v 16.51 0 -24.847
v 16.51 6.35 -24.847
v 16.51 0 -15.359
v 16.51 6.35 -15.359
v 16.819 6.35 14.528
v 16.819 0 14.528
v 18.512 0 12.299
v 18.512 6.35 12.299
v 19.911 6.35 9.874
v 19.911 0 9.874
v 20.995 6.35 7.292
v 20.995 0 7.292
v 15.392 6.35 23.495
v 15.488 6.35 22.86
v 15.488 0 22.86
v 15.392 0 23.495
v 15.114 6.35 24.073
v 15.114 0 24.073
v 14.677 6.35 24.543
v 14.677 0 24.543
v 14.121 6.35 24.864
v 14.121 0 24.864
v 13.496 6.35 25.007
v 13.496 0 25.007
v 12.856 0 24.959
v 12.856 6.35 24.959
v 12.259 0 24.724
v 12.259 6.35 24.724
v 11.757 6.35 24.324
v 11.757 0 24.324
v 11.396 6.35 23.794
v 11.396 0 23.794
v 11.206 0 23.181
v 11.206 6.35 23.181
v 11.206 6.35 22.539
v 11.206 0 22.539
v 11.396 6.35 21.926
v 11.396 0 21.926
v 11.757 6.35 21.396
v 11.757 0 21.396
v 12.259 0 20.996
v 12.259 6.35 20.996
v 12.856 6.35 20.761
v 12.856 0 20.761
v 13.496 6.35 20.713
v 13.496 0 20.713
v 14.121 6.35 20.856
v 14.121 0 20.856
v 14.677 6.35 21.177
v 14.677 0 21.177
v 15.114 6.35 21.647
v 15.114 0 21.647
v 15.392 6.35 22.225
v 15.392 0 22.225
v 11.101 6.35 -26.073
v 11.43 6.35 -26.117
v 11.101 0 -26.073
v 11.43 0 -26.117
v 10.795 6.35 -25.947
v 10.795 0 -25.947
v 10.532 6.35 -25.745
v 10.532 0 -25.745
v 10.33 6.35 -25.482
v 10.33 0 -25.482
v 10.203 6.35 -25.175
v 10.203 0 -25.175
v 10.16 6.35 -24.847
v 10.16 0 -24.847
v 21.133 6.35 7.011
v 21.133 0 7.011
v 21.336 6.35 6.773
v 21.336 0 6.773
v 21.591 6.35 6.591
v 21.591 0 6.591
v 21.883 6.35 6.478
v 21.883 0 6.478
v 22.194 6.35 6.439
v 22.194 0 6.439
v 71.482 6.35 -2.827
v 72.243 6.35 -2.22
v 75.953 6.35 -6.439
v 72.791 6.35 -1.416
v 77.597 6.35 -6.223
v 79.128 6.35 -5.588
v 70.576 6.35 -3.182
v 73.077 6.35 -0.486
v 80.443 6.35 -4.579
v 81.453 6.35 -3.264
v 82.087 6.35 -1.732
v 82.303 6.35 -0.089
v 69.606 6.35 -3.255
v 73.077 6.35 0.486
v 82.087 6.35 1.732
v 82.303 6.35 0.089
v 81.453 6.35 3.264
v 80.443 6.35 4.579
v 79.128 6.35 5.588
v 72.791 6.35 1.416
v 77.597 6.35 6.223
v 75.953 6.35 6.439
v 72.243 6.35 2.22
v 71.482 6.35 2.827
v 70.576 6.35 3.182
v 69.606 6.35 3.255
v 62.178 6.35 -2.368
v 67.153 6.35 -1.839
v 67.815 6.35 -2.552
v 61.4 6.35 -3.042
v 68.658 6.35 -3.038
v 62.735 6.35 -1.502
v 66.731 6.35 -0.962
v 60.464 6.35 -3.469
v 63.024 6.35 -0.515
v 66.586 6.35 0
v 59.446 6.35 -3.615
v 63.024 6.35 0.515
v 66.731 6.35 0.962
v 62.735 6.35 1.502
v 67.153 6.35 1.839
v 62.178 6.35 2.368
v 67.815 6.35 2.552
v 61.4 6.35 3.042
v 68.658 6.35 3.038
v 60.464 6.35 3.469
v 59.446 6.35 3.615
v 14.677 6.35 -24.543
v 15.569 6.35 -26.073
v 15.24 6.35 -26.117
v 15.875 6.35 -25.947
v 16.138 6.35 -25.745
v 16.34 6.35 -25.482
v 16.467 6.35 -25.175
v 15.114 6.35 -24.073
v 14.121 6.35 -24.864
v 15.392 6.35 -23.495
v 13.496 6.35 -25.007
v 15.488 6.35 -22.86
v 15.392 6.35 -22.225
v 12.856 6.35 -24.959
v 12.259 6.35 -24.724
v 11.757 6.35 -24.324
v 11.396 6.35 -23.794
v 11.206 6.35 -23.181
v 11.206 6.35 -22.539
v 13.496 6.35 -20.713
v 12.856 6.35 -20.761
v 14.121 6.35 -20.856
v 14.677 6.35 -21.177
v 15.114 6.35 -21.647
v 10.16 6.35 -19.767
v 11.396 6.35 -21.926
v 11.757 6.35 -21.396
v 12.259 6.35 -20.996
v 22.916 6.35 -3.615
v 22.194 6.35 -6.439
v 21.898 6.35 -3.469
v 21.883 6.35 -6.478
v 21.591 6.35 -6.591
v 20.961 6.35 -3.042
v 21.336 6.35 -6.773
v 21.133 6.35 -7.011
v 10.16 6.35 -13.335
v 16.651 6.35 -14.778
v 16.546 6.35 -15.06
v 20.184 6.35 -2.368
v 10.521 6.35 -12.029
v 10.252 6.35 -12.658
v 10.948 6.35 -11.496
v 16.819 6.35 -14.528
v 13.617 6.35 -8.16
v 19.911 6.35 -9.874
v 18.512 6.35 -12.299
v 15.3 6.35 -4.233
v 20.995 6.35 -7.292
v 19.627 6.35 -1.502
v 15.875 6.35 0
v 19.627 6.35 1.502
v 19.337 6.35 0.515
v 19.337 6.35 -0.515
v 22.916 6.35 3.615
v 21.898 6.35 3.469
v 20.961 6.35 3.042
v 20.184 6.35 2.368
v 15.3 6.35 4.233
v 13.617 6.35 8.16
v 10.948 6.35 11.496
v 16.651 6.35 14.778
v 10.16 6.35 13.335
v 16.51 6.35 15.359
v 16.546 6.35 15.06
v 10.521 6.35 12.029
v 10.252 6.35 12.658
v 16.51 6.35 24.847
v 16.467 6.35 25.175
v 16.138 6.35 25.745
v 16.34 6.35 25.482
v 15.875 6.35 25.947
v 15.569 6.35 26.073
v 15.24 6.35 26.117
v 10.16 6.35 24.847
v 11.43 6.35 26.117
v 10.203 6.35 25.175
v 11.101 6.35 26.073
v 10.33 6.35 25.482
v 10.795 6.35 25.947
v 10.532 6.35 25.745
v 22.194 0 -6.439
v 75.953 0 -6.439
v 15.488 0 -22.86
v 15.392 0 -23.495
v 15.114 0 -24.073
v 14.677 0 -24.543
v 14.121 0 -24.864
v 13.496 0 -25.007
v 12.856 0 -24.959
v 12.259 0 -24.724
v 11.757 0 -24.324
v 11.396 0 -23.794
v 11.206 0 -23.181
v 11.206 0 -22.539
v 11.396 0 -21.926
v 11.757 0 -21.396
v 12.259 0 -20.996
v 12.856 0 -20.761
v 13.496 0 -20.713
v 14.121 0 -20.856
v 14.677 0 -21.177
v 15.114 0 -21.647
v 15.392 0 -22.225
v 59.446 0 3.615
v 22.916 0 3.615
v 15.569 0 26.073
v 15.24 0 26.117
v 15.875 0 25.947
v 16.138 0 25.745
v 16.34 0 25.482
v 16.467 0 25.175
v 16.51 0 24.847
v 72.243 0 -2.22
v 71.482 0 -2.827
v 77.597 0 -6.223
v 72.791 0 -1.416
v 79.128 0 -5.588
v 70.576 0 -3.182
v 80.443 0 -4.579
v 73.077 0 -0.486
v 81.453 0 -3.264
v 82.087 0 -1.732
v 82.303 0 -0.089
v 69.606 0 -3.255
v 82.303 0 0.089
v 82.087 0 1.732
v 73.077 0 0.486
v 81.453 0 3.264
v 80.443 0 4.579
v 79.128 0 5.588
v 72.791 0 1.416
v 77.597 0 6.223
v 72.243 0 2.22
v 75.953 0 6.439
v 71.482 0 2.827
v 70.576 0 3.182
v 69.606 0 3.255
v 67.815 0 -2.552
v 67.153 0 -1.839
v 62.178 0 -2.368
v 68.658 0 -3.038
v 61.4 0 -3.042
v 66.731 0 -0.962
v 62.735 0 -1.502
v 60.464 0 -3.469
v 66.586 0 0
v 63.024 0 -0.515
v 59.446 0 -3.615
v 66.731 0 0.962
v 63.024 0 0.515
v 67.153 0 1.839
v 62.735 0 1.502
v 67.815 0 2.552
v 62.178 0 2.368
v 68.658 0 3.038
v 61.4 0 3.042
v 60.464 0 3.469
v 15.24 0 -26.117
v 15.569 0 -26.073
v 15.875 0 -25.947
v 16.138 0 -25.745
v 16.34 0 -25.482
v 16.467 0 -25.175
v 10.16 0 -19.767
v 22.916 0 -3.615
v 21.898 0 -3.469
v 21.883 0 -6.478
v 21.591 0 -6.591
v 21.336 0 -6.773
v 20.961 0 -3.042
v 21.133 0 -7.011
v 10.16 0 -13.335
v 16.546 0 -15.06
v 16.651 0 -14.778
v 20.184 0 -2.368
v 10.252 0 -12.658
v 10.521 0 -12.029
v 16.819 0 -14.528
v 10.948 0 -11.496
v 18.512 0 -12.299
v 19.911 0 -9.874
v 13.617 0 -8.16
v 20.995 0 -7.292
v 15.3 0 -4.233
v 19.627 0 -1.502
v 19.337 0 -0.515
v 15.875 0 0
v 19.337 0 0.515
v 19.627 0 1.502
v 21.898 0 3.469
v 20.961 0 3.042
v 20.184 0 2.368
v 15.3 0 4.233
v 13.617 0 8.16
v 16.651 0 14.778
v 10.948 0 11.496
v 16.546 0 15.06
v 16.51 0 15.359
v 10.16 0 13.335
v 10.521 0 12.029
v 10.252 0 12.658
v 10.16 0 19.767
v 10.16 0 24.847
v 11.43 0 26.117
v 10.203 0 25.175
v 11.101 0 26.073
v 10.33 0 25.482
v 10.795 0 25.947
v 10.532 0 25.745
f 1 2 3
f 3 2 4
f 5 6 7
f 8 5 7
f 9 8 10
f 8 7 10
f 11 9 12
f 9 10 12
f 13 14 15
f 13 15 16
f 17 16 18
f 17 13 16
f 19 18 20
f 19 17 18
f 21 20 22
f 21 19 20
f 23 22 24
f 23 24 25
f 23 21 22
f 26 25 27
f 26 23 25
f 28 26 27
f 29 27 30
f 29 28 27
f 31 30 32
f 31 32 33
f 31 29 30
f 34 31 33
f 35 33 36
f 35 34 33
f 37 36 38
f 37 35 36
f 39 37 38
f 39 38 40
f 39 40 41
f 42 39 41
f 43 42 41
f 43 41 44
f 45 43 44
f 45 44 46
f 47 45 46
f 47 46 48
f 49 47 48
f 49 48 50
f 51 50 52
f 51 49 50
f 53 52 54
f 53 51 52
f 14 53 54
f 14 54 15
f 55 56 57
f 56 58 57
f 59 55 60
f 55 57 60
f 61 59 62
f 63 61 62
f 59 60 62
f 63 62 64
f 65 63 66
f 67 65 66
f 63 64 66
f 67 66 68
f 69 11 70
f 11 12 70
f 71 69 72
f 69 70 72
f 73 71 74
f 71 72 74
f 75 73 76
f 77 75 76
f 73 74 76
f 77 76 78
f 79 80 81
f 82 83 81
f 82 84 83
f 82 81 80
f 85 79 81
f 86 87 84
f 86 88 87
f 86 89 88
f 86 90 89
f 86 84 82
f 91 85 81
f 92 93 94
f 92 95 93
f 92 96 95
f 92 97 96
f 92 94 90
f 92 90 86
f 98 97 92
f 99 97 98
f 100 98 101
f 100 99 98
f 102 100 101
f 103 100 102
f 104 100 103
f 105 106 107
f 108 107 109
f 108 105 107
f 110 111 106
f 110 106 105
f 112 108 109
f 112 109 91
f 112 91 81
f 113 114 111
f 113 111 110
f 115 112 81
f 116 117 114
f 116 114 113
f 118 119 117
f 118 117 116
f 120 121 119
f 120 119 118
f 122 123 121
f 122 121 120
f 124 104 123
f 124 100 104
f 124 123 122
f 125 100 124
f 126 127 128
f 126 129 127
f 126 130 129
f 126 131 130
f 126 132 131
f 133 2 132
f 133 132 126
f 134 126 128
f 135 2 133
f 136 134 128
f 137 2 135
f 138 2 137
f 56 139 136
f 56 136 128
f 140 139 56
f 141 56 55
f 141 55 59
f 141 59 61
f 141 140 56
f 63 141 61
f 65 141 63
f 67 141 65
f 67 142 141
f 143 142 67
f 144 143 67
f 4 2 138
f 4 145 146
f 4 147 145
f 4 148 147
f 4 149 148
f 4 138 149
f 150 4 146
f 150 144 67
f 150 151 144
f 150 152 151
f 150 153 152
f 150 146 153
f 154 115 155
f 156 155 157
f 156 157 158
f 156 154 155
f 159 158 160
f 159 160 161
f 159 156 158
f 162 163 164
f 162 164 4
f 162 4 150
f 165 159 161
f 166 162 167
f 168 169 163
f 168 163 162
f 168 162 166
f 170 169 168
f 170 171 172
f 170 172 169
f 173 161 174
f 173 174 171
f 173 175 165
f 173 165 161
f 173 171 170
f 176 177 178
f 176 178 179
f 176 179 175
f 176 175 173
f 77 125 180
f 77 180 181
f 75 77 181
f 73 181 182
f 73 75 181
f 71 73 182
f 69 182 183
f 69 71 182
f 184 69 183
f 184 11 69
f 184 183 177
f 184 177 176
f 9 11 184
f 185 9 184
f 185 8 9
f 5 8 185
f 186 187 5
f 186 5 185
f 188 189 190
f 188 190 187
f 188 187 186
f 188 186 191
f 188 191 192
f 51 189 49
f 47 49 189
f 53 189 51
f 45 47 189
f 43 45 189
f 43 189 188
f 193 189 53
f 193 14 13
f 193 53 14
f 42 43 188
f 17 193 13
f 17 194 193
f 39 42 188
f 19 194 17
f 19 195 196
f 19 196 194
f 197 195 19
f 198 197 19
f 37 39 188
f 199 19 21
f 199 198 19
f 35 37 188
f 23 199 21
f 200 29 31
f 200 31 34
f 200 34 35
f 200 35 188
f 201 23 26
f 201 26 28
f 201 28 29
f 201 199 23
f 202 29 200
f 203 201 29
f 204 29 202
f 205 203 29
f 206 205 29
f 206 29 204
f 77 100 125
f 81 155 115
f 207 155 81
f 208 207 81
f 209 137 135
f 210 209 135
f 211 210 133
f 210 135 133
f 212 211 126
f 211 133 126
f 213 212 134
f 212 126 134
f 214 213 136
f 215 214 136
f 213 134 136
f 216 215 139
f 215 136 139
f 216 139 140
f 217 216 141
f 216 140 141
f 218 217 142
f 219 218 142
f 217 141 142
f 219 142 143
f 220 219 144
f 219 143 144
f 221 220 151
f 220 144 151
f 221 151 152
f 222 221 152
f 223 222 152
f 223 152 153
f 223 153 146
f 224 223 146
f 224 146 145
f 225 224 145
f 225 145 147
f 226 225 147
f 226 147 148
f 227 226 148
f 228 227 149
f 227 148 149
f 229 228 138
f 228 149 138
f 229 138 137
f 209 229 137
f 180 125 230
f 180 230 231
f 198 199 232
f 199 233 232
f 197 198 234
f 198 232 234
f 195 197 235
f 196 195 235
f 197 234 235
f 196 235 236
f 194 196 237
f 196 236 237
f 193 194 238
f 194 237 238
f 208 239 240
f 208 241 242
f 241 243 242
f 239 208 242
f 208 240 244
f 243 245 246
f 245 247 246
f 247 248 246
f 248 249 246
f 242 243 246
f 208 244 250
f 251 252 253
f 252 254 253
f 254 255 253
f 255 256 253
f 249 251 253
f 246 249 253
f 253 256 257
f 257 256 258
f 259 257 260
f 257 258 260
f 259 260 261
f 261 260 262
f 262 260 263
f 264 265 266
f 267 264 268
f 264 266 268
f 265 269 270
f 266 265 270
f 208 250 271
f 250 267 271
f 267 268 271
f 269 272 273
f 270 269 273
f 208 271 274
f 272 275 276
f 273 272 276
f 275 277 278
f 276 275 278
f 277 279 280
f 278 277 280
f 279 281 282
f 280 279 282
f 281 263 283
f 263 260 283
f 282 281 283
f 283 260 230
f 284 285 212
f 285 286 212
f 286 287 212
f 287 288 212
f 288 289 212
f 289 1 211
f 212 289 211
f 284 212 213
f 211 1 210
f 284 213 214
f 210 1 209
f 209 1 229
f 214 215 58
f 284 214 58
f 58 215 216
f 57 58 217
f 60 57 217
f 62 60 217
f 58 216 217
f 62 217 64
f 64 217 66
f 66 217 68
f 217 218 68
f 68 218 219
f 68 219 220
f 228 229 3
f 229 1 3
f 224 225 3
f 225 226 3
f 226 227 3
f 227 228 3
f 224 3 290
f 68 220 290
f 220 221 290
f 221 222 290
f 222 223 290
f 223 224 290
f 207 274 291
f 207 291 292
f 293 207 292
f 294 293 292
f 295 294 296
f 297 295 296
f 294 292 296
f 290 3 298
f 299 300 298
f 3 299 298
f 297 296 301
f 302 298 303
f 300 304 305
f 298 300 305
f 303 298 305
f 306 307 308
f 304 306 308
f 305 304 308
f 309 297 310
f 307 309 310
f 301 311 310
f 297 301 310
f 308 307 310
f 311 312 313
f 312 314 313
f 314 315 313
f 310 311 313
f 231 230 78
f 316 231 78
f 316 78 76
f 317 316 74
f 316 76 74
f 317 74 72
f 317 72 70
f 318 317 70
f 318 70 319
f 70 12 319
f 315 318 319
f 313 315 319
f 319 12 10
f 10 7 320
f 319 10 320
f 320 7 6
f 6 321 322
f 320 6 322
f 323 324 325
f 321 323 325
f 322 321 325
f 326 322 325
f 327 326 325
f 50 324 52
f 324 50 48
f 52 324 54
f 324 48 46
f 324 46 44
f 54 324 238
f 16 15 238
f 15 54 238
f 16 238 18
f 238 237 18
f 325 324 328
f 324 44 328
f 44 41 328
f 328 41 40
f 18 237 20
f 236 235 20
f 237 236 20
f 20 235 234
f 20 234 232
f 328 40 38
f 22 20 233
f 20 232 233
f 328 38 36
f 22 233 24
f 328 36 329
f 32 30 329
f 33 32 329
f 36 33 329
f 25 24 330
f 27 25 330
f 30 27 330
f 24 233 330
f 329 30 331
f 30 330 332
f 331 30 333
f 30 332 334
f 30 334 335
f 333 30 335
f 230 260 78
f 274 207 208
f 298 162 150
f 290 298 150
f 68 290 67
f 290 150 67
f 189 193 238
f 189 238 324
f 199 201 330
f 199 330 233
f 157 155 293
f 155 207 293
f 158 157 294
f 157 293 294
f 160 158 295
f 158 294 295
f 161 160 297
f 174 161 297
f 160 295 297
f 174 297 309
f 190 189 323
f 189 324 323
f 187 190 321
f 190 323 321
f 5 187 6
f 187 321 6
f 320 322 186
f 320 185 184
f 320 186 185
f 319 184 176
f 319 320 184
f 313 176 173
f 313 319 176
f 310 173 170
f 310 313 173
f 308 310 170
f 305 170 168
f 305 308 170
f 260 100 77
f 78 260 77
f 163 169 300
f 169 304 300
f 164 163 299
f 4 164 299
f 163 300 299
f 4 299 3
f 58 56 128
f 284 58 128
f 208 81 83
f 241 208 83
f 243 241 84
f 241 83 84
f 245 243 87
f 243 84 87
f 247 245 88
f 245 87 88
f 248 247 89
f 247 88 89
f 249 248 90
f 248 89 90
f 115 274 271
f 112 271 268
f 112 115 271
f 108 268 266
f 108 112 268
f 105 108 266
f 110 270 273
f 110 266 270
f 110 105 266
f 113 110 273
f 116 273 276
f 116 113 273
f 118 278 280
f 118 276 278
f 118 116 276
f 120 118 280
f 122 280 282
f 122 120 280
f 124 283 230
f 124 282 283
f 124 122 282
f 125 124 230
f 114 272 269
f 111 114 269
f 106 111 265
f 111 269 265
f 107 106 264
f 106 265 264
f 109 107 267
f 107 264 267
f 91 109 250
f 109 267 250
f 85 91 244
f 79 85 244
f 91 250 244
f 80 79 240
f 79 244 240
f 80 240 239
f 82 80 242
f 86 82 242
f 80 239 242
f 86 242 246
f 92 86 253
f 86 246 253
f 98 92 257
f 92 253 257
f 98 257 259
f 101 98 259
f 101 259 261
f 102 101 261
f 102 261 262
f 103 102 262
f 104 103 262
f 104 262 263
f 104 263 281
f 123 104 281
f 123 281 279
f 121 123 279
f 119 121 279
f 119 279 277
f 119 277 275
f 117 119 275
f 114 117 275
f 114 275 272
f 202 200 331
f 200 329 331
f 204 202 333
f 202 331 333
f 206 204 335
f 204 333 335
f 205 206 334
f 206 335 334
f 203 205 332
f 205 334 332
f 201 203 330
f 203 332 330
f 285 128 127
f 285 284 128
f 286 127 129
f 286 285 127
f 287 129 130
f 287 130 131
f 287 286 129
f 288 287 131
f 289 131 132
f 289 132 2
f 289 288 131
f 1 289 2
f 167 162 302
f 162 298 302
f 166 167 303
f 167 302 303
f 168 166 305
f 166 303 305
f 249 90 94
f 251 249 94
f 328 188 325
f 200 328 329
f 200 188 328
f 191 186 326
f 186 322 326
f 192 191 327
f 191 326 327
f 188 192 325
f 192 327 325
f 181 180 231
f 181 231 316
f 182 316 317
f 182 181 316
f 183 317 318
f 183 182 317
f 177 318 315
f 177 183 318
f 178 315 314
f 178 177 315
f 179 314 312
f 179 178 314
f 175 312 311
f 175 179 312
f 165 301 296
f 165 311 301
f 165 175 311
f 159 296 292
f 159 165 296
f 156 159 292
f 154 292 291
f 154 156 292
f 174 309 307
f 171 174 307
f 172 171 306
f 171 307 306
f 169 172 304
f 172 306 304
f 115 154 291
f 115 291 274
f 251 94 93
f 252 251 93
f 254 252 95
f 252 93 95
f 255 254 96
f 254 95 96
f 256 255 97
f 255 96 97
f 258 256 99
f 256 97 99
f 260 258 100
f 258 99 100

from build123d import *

# Parameters (mm, degrees)
SKETCH1_R                = 22.225
SKETCH1_R_2              = 15.875
BOSS_EXTRUDE1_DEPTH      = 6.35
BOSS_EXTRUDE2_DEPTH      = 6.35
F_0_257_DIAMETER_HOLE1_D = 6.5278
SKETCH6_W                = 65.552410467
SKETCH6_H                = 82.171101747
CUT_EXTRUDE2_DEPTH       = 7.35
FILLET2_R                = 2.54
SKETCH9_R                = 2.15265
BOSS_EXTRUDE3_DEPTH      = 6.35
FILLET4_R                = 1.27
CUT_EXTRUDE3_DEPTH       = 7.35


with BuildPart() as part:
    # Sketch1 → Boss-Extrude1 (new body)
    with BuildSketch(Plane(origin=(0, 0, 0), x_dir=(1, 0, 0), z_dir=(0, 1, 0))):
        Circle(SKETCH1_R)
        Circle(SKETCH1_R_2, mode=Mode.SUBTRACT)
    extrude(amount=BOSS_EXTRUDE1_DEPTH)

    # Sketch2 → Boss-Extrude2 (add)
    with BuildSketch(Plane(origin=(0, 6.35, 0), x_dir=(1, 0, 0), z_dir=(0, 1, 0))):
        with BuildLine():
            Line((75.953359527, -6.4389), (38.518839527, -6.4389))
            Line((38.518839527, -6.4389), (17.590769706, -6.4389))
            Line((17.590769706, -6.4389), (17.590769706, 6.4389))
            Line((17.590769706, 6.4389), (38.518839527, 6.4389))
            Line((38.518839527, 6.4389), (75.953359527, 6.4389))
            ThreePointArc((75.953359527, 6.4389), (80.443487588, 4.579028061), (82.303359527, 0.0889))
            Line((82.303359527, 0.0889), (82.303359527, -0.0889))
            ThreePointArc((82.303359527, -0.0889), (80.443487588, -4.579028061), (75.953359527, -6.4389))
        make_face()
    extrude(amount=-BOSS_EXTRUDE2_DEPTH)

    # F (0.257) Diameter Hole1 (through all)
    with Locations(Plane(origin=(0, 6.35, 0), x_dir=(1, 0, 0), z_dir=(0, 1, 0))):
        with Locations((69.85, 0)):
            Hole(F_0_257_DIAMETER_HOLE1_D / 2)

    # Sketch6 → Cut-Extrude2 (cut, through all)
    with BuildSketch(Plane(origin=(0, 6.35, 0), x_dir=(1, 0, 0), z_dir=(0, 1, 0))):
        with Locations((-22.616205234, -1.153387837)):
            Rectangle(SKETCH6_W, SKETCH6_H)
    extrude(amount=-CUT_EXTRUDE2_DEPTH, mode=Mode.SUBTRACT)

    # Fillet2
    fillet2_edges = [part.edges().sort_by_distance(p)[0] for p in [
        (10.16, 3.175, -12.197951672),
        (10.16, 3.175, 12.197951672),
    ]]
    fillet(fillet2_edges, radius=FILLET2_R)

    # Sketch9 → Boss-Extrude3 (add)
    with BuildSketch(Plane(origin=(0, 6.35, 0), x_dir=(1, 0, 0), z_dir=(0, 1, 0))):
        Polygon((10.16, 19.766765669), (10.16, 26.116765669), (16.51, 26.116765669), (16.51, 14.878525633), align=None)
        with Locations((13.335, 22.86)):
            Circle(SKETCH9_R, mode=Mode.SUBTRACT)
    boss_extrude3 = extrude(amount=-BOSS_EXTRUDE3_DEPTH)

    # Mirror1: Boss-Extrude3 across plane
    add(boss_extrude3.mirror(Plane.XY))

    # Fillet4
    fillet4_edges = [part.edges().sort_by_distance(p)[0] for p in [
        (21.271840348, 3.175, 6.4389),
        (21.271840348, 3.175, -6.4389),
        (16.51, 3.175, 14.878525633),
        (16.51, 3.175, 26.116765669),
        (10.16, 3.175, 26.116765669),
        (16.51, 3.175, -14.878525633),
        (10.16, 3.175, -26.116765669),
        (16.51, 3.175, -26.116765669),
    ]]
    fillet(fillet4_edges, radius=FILLET4_R)

    # Sketch11 → Cut-Extrude3 (cut, through all)
    with BuildSketch(Plane(origin=(0, 6.35, 0), x_dir=(1, 0, 0), z_dir=(0, 1, 0))):
        with BuildLine():
            Line((59.445816997, -3.615471241), (22.916160789, -3.615471241))
            ThreePointArc((22.916160789, -3.615471241), (19.300689548, 0), (22.916160789, 3.615471241))
            Line((22.916160789, 3.615471241), (59.445816997, 3.615471241))
            ThreePointArc((59.445816997, 3.615471241), (63.061288238, 0), (59.445816997, -3.615471241))
        make_face()
    extrude(amount=-CUT_EXTRUDE3_DEPTH, mode=Mode.SUBTRACT)


solid = part.part
